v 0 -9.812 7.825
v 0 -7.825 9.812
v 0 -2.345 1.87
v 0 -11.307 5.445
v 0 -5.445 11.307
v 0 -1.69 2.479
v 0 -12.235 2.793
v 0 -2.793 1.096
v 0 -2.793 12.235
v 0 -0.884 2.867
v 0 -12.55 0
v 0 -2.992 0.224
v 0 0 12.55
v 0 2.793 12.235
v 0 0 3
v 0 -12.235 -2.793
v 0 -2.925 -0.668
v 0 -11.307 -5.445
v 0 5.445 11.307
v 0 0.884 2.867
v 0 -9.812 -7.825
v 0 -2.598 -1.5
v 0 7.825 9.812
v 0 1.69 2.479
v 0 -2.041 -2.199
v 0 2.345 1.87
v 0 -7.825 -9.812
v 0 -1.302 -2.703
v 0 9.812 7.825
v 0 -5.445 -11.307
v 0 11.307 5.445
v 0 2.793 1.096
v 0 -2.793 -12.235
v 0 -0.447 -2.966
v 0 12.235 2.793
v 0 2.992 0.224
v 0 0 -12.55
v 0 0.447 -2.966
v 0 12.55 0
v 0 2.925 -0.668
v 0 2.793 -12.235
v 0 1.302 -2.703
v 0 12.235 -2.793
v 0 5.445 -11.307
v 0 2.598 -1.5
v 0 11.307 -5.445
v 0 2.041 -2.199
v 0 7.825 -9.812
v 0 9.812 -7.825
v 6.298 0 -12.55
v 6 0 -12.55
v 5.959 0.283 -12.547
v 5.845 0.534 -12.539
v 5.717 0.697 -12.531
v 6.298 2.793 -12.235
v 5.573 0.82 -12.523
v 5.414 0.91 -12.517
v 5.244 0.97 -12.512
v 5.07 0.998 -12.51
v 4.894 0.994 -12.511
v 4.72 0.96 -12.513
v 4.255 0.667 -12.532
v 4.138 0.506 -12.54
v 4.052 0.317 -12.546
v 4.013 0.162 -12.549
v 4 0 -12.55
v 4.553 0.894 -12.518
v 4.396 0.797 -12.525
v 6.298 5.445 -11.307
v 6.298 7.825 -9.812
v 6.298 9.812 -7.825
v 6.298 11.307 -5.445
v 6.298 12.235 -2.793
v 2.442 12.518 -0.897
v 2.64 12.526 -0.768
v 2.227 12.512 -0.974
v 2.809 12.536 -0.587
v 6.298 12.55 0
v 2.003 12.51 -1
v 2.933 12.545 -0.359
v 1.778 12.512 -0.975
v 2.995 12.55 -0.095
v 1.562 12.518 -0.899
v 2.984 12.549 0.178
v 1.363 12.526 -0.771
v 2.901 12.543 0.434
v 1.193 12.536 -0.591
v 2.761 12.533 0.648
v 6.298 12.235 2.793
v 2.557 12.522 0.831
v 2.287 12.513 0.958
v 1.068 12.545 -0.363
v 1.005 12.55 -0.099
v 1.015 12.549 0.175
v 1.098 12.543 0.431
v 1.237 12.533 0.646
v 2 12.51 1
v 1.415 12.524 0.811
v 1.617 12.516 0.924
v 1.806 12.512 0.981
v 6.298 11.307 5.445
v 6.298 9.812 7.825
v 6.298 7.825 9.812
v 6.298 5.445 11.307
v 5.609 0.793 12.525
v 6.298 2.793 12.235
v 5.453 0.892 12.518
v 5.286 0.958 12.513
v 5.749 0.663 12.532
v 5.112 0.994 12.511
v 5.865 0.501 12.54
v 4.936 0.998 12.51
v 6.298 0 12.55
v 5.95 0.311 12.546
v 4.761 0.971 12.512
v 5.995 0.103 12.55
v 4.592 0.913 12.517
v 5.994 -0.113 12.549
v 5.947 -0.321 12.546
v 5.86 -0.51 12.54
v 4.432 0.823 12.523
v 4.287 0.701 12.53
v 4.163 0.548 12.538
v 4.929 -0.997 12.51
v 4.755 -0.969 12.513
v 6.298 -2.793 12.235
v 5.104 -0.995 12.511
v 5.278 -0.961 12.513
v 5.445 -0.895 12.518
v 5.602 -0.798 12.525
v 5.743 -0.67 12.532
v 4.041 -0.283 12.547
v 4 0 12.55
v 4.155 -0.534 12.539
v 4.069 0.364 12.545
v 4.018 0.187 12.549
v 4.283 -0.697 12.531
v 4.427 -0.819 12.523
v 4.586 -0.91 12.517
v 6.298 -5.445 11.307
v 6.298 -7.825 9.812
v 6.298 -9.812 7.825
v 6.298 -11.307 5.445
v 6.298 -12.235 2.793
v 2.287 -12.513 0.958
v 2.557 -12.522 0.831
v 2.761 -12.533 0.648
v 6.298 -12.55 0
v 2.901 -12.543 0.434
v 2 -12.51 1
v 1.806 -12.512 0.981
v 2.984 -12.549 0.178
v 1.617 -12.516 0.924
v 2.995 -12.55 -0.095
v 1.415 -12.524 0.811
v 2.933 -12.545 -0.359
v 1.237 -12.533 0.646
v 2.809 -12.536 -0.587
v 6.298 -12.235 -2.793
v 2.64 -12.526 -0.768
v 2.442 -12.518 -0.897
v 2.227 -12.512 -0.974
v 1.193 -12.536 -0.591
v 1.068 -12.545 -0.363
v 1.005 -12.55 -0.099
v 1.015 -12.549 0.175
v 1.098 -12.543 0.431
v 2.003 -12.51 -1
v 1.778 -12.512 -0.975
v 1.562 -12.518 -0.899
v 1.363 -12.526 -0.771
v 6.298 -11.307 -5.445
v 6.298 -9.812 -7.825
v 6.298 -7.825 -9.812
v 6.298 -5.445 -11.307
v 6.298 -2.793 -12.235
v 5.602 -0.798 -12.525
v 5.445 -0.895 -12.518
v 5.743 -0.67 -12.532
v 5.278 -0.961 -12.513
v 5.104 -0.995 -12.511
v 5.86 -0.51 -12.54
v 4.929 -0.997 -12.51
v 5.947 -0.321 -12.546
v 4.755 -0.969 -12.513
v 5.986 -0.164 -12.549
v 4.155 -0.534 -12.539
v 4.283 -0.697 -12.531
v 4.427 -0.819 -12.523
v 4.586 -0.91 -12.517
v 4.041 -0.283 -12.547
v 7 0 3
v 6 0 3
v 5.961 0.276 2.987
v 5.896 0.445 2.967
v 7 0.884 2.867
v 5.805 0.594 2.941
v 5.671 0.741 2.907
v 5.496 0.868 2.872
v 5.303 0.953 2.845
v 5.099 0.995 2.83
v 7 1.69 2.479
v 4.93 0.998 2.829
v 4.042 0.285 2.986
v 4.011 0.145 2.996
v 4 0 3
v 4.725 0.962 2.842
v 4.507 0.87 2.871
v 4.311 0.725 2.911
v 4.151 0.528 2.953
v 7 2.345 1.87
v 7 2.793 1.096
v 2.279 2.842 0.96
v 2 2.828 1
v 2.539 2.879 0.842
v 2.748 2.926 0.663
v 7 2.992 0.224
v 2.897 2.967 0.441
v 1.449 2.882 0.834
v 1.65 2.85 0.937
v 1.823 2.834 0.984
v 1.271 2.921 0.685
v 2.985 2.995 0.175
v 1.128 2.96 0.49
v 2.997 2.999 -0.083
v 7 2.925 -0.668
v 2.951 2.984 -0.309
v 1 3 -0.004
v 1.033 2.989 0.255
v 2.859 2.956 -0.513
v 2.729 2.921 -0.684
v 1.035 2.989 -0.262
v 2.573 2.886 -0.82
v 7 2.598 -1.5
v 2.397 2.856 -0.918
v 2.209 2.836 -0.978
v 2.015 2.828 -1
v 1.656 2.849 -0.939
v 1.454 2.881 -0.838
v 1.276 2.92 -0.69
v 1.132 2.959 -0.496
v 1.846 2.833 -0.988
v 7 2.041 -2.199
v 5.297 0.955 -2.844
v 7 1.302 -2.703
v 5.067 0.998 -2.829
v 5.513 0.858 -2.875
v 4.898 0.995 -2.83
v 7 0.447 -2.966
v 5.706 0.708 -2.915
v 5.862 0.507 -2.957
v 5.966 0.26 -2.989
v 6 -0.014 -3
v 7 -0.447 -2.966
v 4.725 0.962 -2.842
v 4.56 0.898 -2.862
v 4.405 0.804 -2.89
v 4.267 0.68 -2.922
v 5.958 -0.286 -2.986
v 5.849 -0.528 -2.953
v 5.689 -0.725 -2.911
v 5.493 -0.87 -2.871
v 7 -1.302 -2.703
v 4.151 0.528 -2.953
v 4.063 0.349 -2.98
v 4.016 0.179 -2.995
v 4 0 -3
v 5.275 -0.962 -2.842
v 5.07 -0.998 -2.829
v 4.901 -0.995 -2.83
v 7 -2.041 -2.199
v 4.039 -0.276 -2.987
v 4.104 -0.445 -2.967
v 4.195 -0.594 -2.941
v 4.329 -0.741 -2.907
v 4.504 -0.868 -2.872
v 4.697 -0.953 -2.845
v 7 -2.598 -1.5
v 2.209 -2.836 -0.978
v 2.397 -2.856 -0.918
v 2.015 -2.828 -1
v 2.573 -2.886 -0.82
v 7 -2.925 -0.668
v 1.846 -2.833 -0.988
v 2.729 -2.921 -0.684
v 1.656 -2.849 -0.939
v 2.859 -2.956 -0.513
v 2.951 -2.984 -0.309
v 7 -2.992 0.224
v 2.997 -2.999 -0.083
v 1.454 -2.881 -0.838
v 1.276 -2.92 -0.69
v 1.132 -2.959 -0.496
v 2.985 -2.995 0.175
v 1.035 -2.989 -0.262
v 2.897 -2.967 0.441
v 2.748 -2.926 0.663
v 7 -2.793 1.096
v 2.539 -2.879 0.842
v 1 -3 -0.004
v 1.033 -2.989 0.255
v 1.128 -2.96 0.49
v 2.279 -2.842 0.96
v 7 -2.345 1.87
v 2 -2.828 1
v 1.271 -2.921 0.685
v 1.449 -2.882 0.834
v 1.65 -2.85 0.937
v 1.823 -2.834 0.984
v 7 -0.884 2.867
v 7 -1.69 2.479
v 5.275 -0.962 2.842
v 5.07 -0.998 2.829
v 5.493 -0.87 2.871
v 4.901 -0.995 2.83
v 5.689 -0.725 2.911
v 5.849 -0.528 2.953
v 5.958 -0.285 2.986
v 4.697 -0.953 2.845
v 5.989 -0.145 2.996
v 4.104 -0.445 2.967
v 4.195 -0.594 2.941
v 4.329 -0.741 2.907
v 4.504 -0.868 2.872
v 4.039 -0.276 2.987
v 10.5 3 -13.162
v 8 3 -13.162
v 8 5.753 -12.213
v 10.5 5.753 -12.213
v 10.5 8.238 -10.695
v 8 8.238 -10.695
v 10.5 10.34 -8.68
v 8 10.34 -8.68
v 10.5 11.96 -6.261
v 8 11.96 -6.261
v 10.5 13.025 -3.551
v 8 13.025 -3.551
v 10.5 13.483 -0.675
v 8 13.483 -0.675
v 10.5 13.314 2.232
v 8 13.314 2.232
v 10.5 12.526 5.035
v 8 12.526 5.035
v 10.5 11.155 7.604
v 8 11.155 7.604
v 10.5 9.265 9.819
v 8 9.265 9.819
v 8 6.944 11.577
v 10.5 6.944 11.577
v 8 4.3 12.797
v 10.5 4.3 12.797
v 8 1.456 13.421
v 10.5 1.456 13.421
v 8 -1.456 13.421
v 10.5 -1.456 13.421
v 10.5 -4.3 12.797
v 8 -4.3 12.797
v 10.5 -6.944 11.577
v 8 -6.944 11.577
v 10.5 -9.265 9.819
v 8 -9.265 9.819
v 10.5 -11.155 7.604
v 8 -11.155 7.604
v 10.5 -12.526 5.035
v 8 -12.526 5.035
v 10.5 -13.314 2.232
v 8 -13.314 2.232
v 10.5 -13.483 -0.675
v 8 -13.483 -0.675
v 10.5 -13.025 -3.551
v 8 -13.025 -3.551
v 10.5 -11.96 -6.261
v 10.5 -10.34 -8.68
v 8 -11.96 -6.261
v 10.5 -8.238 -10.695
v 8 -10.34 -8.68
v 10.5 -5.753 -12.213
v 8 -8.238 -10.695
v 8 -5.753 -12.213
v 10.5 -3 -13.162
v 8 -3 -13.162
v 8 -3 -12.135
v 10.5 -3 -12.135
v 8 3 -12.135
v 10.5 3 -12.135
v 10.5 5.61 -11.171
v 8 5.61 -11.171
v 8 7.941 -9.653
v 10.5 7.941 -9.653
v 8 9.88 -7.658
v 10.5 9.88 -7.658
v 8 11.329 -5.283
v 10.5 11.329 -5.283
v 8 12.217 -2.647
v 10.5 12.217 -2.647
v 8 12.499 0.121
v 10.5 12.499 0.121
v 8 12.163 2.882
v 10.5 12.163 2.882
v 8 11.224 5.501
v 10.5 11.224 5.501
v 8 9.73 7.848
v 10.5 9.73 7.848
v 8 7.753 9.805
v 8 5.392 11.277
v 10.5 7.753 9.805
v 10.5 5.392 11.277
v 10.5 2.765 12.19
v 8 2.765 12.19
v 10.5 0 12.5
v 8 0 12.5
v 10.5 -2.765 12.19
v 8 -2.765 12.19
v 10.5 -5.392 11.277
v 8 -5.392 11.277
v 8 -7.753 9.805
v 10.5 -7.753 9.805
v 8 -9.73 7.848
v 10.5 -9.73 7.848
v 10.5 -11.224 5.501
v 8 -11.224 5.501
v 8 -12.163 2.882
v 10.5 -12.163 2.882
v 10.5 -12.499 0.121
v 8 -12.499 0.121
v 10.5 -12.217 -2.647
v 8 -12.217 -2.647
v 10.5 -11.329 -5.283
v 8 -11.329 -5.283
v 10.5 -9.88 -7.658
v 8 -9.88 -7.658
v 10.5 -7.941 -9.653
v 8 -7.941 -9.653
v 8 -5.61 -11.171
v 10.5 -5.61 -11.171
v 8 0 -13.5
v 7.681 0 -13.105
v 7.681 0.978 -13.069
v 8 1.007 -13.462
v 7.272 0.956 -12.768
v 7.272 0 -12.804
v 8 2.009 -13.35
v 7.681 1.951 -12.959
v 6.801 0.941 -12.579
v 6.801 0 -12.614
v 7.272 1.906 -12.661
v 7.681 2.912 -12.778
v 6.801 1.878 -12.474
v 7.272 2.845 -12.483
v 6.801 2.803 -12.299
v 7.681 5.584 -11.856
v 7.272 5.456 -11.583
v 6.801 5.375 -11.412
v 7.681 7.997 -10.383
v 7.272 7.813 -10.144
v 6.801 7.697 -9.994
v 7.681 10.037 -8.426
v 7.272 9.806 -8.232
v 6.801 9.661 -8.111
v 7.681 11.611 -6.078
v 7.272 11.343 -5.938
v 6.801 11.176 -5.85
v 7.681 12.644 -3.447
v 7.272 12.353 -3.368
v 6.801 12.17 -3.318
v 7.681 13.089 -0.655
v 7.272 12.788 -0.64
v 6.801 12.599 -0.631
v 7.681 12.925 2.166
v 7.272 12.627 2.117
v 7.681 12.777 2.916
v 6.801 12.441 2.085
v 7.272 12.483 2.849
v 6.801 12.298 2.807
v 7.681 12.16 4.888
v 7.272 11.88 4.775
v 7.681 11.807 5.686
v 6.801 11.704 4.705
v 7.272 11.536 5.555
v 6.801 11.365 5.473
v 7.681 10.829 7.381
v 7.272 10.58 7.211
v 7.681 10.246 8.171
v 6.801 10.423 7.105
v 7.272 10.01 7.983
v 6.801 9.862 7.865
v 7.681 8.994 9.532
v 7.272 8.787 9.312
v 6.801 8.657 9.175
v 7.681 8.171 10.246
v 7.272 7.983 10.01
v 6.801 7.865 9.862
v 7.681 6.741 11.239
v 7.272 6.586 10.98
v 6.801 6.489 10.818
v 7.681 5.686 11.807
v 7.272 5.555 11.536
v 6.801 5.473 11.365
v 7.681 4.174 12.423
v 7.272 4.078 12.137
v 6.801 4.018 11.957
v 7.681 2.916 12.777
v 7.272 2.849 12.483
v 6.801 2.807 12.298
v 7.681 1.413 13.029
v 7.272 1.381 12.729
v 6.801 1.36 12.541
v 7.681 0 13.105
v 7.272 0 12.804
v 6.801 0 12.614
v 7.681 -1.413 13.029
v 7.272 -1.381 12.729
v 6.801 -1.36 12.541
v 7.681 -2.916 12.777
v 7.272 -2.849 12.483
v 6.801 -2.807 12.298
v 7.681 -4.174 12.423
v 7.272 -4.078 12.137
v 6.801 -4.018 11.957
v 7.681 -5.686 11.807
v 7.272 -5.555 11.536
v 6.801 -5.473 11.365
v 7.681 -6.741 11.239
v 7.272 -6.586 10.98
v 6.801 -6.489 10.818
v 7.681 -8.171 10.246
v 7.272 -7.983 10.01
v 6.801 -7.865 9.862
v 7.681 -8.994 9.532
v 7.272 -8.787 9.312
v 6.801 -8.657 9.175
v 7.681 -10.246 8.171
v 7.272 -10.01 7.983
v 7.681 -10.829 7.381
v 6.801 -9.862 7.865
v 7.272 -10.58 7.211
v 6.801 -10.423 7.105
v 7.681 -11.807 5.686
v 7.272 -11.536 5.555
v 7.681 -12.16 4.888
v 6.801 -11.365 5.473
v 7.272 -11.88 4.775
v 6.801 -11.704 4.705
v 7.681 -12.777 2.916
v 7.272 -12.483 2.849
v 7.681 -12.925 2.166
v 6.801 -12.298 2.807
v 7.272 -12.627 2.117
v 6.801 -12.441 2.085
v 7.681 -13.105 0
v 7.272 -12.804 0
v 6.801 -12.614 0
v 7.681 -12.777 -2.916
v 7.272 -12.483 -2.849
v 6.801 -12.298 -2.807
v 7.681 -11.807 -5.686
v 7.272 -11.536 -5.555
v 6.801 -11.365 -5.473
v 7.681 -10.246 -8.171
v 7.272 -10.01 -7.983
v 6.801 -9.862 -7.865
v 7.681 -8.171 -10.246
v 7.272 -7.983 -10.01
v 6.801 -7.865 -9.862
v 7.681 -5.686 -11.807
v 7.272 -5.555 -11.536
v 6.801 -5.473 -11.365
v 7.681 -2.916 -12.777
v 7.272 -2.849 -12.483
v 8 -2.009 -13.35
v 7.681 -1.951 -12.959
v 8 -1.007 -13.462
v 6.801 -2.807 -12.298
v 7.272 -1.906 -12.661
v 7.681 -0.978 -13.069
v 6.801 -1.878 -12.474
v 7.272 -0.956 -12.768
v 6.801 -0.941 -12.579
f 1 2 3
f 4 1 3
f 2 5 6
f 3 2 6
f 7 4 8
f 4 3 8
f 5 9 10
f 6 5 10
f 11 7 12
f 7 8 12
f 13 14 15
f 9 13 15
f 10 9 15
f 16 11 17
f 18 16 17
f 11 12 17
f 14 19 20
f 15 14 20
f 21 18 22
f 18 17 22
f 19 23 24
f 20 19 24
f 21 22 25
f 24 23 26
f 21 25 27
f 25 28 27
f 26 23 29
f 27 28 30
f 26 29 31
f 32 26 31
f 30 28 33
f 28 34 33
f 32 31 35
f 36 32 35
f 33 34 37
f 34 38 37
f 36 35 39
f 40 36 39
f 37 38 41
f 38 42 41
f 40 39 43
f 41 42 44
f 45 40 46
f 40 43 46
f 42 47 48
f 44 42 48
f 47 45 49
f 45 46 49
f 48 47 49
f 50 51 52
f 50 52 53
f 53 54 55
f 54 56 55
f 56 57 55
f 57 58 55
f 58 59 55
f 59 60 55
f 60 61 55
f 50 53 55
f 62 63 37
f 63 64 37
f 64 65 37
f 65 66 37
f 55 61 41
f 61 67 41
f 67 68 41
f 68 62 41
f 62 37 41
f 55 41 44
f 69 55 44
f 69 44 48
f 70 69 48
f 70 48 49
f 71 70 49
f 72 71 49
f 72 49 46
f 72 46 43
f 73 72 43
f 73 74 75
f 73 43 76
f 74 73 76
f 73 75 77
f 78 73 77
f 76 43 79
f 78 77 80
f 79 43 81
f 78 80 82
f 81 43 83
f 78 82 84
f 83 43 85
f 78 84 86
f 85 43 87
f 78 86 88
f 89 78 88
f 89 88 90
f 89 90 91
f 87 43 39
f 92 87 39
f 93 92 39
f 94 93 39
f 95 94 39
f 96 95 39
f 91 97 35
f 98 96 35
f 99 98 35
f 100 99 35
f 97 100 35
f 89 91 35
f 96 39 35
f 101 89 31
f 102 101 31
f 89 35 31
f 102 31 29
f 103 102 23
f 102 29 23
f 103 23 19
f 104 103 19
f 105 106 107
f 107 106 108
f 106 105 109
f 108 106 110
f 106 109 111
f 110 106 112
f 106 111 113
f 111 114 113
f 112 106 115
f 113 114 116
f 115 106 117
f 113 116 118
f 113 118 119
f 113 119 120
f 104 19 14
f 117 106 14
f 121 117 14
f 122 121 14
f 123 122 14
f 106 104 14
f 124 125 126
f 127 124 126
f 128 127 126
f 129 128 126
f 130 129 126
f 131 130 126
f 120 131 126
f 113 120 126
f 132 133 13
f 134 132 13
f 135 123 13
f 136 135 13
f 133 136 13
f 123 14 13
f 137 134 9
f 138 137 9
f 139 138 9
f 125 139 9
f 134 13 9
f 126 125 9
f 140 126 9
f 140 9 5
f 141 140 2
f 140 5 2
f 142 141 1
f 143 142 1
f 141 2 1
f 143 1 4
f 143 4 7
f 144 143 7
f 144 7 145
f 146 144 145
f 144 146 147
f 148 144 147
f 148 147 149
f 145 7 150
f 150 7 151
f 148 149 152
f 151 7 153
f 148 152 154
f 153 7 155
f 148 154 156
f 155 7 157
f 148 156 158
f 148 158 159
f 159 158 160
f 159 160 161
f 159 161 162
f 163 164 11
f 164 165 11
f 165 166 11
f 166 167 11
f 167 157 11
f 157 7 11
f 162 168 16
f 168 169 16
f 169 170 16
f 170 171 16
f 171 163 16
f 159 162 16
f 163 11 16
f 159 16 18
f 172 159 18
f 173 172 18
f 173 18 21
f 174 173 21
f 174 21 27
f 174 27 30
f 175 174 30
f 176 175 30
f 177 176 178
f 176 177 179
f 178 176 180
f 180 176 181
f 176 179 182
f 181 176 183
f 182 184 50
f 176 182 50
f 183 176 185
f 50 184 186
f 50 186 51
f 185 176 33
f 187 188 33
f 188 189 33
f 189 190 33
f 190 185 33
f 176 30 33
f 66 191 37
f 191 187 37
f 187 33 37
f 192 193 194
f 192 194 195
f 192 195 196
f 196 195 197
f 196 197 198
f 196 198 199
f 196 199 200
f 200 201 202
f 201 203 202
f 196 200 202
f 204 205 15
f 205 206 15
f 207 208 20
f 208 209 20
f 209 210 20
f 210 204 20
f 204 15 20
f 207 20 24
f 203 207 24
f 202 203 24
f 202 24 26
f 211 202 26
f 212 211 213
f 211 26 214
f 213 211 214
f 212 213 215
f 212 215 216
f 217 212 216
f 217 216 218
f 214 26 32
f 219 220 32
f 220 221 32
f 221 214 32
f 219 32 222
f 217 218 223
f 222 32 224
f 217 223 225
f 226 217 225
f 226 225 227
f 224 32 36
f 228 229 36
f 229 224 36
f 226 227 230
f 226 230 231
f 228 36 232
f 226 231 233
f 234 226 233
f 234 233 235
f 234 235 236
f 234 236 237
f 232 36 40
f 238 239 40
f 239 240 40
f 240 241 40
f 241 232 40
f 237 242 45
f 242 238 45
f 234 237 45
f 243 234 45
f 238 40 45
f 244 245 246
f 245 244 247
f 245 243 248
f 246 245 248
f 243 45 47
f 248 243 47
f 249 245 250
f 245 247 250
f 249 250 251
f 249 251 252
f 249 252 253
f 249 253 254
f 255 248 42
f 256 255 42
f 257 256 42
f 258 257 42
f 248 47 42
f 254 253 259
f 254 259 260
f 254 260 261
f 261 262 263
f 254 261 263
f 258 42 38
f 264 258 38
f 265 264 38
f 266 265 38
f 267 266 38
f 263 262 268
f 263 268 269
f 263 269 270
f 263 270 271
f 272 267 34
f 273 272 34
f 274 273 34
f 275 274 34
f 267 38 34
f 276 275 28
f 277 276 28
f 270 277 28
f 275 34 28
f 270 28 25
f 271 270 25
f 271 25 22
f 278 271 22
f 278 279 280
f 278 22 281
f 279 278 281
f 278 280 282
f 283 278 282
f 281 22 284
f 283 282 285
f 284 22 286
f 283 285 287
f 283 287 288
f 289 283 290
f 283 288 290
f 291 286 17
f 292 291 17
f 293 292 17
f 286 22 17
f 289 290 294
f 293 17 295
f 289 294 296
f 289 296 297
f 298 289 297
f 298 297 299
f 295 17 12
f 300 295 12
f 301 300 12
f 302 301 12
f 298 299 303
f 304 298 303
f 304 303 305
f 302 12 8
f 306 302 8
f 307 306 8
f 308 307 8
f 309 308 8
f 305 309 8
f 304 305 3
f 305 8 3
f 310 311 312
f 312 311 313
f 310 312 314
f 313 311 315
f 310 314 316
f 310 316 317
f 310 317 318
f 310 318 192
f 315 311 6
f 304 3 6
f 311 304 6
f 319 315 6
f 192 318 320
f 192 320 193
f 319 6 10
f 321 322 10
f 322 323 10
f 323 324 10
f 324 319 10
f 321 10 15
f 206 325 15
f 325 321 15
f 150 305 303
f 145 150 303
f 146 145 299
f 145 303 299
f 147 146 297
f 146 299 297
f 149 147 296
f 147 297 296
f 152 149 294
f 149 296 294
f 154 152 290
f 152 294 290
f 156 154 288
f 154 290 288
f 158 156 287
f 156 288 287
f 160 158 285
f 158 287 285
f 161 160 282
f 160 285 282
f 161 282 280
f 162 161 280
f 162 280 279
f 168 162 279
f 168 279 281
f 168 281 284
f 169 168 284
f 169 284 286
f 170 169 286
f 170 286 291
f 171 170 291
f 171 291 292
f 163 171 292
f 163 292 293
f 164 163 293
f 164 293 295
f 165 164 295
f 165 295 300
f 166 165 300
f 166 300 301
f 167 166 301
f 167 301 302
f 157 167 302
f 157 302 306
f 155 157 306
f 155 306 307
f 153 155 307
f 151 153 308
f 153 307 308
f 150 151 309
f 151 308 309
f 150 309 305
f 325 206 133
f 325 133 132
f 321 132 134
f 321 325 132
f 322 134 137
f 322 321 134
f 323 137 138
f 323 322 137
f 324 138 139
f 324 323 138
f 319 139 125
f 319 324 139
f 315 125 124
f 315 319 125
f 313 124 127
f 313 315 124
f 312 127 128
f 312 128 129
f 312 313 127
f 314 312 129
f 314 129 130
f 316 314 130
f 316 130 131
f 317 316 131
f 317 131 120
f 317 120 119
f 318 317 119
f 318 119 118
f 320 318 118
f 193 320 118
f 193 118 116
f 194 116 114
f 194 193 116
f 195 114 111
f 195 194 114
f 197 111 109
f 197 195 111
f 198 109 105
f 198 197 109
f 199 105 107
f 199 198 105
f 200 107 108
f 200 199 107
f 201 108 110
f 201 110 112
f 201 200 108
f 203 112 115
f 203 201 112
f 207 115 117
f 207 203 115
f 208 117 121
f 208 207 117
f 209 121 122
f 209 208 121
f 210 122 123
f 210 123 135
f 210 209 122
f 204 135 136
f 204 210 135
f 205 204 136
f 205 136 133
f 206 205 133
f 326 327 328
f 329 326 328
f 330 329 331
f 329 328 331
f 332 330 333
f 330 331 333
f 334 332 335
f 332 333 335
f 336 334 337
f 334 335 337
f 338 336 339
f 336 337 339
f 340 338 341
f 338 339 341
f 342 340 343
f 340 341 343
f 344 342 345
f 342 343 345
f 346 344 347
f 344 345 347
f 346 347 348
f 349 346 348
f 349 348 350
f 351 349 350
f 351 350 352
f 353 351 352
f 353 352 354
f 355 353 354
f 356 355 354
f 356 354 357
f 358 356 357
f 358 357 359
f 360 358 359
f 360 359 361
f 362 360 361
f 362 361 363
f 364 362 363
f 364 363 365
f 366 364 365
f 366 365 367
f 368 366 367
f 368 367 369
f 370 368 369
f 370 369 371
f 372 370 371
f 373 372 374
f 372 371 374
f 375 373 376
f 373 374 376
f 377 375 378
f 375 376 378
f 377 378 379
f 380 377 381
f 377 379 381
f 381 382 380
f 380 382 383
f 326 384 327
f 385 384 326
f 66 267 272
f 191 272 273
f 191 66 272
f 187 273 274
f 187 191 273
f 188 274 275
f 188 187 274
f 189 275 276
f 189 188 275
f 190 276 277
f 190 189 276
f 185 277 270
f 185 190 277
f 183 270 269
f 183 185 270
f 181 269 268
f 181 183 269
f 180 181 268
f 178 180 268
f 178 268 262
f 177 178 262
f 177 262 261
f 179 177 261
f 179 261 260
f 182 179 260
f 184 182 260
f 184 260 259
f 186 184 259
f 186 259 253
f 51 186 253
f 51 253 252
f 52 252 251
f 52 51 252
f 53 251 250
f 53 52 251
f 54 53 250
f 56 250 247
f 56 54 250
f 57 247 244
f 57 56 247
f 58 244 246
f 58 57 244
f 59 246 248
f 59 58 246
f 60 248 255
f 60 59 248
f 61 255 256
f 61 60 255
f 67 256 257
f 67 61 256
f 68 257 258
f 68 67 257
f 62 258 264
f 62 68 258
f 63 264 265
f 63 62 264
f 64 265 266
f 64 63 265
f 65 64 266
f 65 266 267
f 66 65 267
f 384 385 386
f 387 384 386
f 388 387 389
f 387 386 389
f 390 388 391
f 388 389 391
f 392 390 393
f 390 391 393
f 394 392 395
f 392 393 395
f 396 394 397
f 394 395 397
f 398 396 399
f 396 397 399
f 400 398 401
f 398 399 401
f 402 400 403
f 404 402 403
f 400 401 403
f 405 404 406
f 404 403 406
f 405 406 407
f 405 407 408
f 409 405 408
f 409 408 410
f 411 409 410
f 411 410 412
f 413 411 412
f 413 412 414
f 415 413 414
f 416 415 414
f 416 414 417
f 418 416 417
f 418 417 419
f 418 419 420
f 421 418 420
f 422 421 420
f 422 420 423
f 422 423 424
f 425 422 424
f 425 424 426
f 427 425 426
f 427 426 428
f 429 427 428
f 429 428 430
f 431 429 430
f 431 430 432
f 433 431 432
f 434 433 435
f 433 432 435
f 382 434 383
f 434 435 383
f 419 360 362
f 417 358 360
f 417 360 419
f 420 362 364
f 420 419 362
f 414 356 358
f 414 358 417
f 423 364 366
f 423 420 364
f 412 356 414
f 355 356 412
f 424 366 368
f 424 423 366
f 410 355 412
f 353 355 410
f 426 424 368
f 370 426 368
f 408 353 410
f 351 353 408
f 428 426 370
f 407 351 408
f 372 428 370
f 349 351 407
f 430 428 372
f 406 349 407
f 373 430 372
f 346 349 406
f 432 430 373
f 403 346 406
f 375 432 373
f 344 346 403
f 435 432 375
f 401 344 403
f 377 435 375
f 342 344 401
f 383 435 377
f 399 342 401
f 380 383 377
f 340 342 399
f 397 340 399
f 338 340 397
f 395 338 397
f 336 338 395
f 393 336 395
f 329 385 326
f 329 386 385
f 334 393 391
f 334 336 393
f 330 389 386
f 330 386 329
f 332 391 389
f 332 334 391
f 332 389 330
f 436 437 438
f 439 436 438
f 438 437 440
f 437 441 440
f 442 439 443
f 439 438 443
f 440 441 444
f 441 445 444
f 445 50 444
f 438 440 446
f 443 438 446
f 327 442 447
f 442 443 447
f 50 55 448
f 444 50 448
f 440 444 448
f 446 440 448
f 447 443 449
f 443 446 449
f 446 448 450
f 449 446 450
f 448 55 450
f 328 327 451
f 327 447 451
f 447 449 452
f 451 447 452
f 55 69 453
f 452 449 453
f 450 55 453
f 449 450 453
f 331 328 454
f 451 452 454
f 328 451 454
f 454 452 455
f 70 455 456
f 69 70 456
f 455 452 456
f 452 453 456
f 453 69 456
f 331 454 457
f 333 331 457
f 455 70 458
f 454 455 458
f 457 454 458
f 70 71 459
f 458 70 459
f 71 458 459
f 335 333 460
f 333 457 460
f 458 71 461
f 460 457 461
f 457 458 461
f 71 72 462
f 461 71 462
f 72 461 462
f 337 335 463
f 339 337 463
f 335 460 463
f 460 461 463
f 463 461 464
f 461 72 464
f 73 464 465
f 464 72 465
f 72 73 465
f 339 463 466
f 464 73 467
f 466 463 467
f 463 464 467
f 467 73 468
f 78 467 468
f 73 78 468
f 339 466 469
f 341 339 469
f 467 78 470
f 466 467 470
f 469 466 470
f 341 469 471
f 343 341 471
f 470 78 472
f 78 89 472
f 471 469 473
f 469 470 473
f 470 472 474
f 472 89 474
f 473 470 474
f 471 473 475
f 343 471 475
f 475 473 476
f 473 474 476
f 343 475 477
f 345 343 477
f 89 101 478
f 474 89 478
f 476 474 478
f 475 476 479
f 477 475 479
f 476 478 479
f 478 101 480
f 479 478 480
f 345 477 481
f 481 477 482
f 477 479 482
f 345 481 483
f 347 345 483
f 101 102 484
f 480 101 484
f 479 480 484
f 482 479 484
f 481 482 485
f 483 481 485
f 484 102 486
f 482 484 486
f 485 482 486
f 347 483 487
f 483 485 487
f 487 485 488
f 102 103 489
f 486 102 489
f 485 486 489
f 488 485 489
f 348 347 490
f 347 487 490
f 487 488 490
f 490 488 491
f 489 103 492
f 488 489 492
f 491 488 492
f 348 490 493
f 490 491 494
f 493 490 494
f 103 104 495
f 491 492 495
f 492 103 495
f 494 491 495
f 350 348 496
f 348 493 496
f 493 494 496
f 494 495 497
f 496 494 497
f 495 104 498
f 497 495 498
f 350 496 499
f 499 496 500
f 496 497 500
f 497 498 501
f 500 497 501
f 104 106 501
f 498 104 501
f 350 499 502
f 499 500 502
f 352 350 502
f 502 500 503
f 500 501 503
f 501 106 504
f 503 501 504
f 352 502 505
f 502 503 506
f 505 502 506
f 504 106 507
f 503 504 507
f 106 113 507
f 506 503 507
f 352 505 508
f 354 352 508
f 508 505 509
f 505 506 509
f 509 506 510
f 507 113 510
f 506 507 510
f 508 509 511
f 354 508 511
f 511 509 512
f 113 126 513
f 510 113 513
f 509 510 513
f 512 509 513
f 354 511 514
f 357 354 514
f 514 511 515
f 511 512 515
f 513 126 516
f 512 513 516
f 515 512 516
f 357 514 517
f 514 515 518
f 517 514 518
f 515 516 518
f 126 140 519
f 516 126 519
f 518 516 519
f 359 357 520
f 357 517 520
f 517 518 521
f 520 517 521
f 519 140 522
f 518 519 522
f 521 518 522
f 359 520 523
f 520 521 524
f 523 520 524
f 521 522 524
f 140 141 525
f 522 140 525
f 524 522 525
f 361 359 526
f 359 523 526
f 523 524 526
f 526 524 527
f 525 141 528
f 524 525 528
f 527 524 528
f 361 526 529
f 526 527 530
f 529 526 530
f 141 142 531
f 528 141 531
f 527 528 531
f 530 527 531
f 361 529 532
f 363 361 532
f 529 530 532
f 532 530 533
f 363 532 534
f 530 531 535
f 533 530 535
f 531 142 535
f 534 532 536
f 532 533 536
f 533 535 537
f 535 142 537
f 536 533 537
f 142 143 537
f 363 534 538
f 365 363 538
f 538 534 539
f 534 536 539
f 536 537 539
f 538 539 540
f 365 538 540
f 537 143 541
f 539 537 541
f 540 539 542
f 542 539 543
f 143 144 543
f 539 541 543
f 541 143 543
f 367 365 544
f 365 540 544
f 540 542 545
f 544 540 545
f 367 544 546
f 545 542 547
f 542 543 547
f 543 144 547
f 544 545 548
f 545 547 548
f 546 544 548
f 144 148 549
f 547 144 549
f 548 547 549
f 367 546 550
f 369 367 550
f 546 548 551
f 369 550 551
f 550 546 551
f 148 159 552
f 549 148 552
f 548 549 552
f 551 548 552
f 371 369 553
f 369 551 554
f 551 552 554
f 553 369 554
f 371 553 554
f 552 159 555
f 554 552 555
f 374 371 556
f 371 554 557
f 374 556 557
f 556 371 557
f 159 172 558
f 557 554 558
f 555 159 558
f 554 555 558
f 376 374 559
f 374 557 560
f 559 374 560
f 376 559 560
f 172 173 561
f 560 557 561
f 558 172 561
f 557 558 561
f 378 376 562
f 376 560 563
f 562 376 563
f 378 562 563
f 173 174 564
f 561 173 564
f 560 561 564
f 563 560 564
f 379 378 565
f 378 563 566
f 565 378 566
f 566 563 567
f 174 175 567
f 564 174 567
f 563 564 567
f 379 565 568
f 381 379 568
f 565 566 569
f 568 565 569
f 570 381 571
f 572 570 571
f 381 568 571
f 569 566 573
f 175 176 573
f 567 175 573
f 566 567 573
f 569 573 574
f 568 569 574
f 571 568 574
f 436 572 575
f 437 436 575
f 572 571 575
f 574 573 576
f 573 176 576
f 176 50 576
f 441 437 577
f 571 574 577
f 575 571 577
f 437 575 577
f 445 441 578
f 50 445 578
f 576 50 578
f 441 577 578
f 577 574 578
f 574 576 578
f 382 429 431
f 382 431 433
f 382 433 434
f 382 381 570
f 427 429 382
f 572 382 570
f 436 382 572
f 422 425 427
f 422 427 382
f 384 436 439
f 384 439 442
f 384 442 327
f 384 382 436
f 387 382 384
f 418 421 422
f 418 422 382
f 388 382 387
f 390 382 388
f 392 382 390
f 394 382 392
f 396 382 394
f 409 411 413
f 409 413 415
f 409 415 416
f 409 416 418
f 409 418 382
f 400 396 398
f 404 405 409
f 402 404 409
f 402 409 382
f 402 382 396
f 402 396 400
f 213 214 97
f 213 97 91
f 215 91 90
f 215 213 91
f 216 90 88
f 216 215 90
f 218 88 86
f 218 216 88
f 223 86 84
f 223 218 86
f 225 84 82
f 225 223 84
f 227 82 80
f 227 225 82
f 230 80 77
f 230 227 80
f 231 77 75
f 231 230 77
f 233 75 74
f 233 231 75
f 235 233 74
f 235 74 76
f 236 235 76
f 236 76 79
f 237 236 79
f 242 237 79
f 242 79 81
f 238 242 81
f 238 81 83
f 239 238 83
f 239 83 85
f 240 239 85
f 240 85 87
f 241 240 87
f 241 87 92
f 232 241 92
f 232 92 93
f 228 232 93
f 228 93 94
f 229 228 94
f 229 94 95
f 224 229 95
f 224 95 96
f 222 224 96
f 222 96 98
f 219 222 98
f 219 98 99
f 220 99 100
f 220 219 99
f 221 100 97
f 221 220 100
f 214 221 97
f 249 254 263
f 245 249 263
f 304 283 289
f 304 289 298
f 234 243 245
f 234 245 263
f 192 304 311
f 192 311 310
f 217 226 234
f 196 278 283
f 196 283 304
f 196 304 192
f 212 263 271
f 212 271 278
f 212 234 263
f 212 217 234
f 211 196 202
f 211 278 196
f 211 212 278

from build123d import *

# Parameters (mm, degrees)
SKETCH_1_R                      = 12.55
EXTRUDE_1_DEPTH                 = 8
SKETCH_2_R                      = 3
CUT_EXTRUDE_1_DEPTH             = 7
CUT_EXTRUDE_2_REACH             = 21.468
SKETCH_3_R                      = 1
CUT_EXTRUDE_2_DIRECTION_2_REACH = 21.468
CUT_EXTRUDE_3_DEPTH             = 21
CUT_EXTRUDE_3_DEPTH_BACK        = 19
SKETCH_4_R                      = 1
SKETCH_5_R                      = 13.5
EXTRUDE_2_DEPTH                 = 2.5
SKETCH_6_R                      = 12.5
CUT_EXTRUDE_4_DEPTH             = 2.5
FILLET_1_R                      = 2
SKETCH_7_W                      = 2.5
SKETCH_7_H                      = 6
CUT_EXTRUDE_5_DEPTH             = 21.5


with BuildPart() as part:
    # 草图1 → 凸台-拉伸1 (new body)
    with BuildSketch(Plane(origin=(0, 0, 0), x_dir=(0, 0, -1), z_dir=(1, 0, 0))):
        Circle(SKETCH_1_R)
    extrude(amount=EXTRUDE_1_DEPTH)

    # 草图2 → 切除-拉伸1 (cut)
    with BuildSketch(Plane.ZY):
        Circle(SKETCH_2_R)
    extrude(amount=-CUT_EXTRUDE_1_DEPTH, mode=Mode.SUBTRACT)

    # 草图3 → 切除-拉伸2 (cut, up to next)
    with BuildSketch(Plane(origin=(0, 0, 0), x_dir=(1, 0, 0), z_dir=(0, 1, 0)), mode=Mode.PRIVATE) as cut_extrude_2_sk1:
        with Locations(Location((2, 0, 0), (0, 0, 270))):
            Circle(SKETCH_3_R)
    cut_extrude_2_tool1 = extrude(cut_extrude_2_sk1.sketch, amount=-CUT_EXTRUDE_2_REACH, mode=Mode.PRIVATE) & part.part
    add(cut_extrude_2_tool1.solids().sort_by_distance((2, 0, 0))[0], mode=Mode.SUBTRACT)

    # 草图3 → 切除-拉伸2 direction 2 (cut, up to next)
    with BuildSketch(Plane(origin=(0, 0, 0), x_dir=(1, 0, 0), z_dir=(0, 1, 0)), mode=Mode.PRIVATE) as cut_extrude_2_direction_2_sk1:
        with Locations(Location((2, 0, 0), (0, 0, 270))):
            Circle(SKETCH_3_R)
    cut_extrude_2_direction_2_tool1 = extrude(cut_extrude_2_direction_2_sk1.sketch, amount=CUT_EXTRUDE_2_DIRECTION_2_REACH, mode=Mode.PRIVATE) & part.part
    add(cut_extrude_2_direction_2_tool1.solids().sort_by_distance((2, 0, 0))[0], mode=Mode.SUBTRACT)

    # 草图4 → 切除-拉伸3 (cut, two sides: drawn at the far end of the back side and taken through both)
    with BuildSketch(Plane.XY.offset(-CUT_EXTRUDE_3_DEPTH_BACK)):
        with Locations(Location((5, 0, 0), (0, 0, 180))):
            Circle(SKETCH_4_R)
    extrude(amount=CUT_EXTRUDE_3_DEPTH + CUT_EXTRUDE_3_DEPTH_BACK, mode=Mode.SUBTRACT)

    # 草图5 → 凸台-拉伸2 (add)
    with BuildSketch(Plane(origin=(8, 0, 0), x_dir=(0, 0, -1), z_dir=(1, 0, 0))):
        Circle(SKETCH_5_R)
    extrude(amount=EXTRUDE_2_DEPTH)

    # 草图6 → 切除-拉伸4 (cut)
    with BuildSketch(Plane(origin=(10.5, 0, 0), x_dir=(0, 0, -1), z_dir=(1, 0, 0))):
        Circle(SKETCH_6_R)
    extrude(amount=-CUT_EXTRUDE_4_DEPTH, mode=Mode.SUBTRACT)

    # 圆角1
    # the kernel refuses this fillet: 2 mm, written as the material it adds along each edge
    with BuildSketch(Plane(origin=(8, 0, 0), x_dir=(0, 0, -1), z_dir=(0, -1, 0))) as fillet_1_piece_1:
        with BuildLine():
            CenterArc((14.55, -1.702204453), FILLET_1_R, 121.668243254, 58.331756746)
            Line((12.55, -1.702204453), (12.51, -1.702204453))
            Line((12.51, -1.702204453), (12.51, 0))
            Line((12.51, 0), (12.55, 0.04))
            ThreePointArc((12.55, 0.04), (13.025, 0.04), (13.479, 0.034044089))
            Line((13.479, 0.034044089), (13.5, 0))
        make_face()
    revolve(axis=Axis((8, 0, 0), (1, 0, 0)))

    # 草图7 → 切除-拉伸5 (cut)
    with BuildSketch(Plane.XY):
        with Locations((9.25, 0)):
            Rectangle(SKETCH_7_W, SKETCH_7_H)
    extrude(amount=-CUT_EXTRUDE_5_DEPTH, mode=Mode.SUBTRACT)


solid = part.part
